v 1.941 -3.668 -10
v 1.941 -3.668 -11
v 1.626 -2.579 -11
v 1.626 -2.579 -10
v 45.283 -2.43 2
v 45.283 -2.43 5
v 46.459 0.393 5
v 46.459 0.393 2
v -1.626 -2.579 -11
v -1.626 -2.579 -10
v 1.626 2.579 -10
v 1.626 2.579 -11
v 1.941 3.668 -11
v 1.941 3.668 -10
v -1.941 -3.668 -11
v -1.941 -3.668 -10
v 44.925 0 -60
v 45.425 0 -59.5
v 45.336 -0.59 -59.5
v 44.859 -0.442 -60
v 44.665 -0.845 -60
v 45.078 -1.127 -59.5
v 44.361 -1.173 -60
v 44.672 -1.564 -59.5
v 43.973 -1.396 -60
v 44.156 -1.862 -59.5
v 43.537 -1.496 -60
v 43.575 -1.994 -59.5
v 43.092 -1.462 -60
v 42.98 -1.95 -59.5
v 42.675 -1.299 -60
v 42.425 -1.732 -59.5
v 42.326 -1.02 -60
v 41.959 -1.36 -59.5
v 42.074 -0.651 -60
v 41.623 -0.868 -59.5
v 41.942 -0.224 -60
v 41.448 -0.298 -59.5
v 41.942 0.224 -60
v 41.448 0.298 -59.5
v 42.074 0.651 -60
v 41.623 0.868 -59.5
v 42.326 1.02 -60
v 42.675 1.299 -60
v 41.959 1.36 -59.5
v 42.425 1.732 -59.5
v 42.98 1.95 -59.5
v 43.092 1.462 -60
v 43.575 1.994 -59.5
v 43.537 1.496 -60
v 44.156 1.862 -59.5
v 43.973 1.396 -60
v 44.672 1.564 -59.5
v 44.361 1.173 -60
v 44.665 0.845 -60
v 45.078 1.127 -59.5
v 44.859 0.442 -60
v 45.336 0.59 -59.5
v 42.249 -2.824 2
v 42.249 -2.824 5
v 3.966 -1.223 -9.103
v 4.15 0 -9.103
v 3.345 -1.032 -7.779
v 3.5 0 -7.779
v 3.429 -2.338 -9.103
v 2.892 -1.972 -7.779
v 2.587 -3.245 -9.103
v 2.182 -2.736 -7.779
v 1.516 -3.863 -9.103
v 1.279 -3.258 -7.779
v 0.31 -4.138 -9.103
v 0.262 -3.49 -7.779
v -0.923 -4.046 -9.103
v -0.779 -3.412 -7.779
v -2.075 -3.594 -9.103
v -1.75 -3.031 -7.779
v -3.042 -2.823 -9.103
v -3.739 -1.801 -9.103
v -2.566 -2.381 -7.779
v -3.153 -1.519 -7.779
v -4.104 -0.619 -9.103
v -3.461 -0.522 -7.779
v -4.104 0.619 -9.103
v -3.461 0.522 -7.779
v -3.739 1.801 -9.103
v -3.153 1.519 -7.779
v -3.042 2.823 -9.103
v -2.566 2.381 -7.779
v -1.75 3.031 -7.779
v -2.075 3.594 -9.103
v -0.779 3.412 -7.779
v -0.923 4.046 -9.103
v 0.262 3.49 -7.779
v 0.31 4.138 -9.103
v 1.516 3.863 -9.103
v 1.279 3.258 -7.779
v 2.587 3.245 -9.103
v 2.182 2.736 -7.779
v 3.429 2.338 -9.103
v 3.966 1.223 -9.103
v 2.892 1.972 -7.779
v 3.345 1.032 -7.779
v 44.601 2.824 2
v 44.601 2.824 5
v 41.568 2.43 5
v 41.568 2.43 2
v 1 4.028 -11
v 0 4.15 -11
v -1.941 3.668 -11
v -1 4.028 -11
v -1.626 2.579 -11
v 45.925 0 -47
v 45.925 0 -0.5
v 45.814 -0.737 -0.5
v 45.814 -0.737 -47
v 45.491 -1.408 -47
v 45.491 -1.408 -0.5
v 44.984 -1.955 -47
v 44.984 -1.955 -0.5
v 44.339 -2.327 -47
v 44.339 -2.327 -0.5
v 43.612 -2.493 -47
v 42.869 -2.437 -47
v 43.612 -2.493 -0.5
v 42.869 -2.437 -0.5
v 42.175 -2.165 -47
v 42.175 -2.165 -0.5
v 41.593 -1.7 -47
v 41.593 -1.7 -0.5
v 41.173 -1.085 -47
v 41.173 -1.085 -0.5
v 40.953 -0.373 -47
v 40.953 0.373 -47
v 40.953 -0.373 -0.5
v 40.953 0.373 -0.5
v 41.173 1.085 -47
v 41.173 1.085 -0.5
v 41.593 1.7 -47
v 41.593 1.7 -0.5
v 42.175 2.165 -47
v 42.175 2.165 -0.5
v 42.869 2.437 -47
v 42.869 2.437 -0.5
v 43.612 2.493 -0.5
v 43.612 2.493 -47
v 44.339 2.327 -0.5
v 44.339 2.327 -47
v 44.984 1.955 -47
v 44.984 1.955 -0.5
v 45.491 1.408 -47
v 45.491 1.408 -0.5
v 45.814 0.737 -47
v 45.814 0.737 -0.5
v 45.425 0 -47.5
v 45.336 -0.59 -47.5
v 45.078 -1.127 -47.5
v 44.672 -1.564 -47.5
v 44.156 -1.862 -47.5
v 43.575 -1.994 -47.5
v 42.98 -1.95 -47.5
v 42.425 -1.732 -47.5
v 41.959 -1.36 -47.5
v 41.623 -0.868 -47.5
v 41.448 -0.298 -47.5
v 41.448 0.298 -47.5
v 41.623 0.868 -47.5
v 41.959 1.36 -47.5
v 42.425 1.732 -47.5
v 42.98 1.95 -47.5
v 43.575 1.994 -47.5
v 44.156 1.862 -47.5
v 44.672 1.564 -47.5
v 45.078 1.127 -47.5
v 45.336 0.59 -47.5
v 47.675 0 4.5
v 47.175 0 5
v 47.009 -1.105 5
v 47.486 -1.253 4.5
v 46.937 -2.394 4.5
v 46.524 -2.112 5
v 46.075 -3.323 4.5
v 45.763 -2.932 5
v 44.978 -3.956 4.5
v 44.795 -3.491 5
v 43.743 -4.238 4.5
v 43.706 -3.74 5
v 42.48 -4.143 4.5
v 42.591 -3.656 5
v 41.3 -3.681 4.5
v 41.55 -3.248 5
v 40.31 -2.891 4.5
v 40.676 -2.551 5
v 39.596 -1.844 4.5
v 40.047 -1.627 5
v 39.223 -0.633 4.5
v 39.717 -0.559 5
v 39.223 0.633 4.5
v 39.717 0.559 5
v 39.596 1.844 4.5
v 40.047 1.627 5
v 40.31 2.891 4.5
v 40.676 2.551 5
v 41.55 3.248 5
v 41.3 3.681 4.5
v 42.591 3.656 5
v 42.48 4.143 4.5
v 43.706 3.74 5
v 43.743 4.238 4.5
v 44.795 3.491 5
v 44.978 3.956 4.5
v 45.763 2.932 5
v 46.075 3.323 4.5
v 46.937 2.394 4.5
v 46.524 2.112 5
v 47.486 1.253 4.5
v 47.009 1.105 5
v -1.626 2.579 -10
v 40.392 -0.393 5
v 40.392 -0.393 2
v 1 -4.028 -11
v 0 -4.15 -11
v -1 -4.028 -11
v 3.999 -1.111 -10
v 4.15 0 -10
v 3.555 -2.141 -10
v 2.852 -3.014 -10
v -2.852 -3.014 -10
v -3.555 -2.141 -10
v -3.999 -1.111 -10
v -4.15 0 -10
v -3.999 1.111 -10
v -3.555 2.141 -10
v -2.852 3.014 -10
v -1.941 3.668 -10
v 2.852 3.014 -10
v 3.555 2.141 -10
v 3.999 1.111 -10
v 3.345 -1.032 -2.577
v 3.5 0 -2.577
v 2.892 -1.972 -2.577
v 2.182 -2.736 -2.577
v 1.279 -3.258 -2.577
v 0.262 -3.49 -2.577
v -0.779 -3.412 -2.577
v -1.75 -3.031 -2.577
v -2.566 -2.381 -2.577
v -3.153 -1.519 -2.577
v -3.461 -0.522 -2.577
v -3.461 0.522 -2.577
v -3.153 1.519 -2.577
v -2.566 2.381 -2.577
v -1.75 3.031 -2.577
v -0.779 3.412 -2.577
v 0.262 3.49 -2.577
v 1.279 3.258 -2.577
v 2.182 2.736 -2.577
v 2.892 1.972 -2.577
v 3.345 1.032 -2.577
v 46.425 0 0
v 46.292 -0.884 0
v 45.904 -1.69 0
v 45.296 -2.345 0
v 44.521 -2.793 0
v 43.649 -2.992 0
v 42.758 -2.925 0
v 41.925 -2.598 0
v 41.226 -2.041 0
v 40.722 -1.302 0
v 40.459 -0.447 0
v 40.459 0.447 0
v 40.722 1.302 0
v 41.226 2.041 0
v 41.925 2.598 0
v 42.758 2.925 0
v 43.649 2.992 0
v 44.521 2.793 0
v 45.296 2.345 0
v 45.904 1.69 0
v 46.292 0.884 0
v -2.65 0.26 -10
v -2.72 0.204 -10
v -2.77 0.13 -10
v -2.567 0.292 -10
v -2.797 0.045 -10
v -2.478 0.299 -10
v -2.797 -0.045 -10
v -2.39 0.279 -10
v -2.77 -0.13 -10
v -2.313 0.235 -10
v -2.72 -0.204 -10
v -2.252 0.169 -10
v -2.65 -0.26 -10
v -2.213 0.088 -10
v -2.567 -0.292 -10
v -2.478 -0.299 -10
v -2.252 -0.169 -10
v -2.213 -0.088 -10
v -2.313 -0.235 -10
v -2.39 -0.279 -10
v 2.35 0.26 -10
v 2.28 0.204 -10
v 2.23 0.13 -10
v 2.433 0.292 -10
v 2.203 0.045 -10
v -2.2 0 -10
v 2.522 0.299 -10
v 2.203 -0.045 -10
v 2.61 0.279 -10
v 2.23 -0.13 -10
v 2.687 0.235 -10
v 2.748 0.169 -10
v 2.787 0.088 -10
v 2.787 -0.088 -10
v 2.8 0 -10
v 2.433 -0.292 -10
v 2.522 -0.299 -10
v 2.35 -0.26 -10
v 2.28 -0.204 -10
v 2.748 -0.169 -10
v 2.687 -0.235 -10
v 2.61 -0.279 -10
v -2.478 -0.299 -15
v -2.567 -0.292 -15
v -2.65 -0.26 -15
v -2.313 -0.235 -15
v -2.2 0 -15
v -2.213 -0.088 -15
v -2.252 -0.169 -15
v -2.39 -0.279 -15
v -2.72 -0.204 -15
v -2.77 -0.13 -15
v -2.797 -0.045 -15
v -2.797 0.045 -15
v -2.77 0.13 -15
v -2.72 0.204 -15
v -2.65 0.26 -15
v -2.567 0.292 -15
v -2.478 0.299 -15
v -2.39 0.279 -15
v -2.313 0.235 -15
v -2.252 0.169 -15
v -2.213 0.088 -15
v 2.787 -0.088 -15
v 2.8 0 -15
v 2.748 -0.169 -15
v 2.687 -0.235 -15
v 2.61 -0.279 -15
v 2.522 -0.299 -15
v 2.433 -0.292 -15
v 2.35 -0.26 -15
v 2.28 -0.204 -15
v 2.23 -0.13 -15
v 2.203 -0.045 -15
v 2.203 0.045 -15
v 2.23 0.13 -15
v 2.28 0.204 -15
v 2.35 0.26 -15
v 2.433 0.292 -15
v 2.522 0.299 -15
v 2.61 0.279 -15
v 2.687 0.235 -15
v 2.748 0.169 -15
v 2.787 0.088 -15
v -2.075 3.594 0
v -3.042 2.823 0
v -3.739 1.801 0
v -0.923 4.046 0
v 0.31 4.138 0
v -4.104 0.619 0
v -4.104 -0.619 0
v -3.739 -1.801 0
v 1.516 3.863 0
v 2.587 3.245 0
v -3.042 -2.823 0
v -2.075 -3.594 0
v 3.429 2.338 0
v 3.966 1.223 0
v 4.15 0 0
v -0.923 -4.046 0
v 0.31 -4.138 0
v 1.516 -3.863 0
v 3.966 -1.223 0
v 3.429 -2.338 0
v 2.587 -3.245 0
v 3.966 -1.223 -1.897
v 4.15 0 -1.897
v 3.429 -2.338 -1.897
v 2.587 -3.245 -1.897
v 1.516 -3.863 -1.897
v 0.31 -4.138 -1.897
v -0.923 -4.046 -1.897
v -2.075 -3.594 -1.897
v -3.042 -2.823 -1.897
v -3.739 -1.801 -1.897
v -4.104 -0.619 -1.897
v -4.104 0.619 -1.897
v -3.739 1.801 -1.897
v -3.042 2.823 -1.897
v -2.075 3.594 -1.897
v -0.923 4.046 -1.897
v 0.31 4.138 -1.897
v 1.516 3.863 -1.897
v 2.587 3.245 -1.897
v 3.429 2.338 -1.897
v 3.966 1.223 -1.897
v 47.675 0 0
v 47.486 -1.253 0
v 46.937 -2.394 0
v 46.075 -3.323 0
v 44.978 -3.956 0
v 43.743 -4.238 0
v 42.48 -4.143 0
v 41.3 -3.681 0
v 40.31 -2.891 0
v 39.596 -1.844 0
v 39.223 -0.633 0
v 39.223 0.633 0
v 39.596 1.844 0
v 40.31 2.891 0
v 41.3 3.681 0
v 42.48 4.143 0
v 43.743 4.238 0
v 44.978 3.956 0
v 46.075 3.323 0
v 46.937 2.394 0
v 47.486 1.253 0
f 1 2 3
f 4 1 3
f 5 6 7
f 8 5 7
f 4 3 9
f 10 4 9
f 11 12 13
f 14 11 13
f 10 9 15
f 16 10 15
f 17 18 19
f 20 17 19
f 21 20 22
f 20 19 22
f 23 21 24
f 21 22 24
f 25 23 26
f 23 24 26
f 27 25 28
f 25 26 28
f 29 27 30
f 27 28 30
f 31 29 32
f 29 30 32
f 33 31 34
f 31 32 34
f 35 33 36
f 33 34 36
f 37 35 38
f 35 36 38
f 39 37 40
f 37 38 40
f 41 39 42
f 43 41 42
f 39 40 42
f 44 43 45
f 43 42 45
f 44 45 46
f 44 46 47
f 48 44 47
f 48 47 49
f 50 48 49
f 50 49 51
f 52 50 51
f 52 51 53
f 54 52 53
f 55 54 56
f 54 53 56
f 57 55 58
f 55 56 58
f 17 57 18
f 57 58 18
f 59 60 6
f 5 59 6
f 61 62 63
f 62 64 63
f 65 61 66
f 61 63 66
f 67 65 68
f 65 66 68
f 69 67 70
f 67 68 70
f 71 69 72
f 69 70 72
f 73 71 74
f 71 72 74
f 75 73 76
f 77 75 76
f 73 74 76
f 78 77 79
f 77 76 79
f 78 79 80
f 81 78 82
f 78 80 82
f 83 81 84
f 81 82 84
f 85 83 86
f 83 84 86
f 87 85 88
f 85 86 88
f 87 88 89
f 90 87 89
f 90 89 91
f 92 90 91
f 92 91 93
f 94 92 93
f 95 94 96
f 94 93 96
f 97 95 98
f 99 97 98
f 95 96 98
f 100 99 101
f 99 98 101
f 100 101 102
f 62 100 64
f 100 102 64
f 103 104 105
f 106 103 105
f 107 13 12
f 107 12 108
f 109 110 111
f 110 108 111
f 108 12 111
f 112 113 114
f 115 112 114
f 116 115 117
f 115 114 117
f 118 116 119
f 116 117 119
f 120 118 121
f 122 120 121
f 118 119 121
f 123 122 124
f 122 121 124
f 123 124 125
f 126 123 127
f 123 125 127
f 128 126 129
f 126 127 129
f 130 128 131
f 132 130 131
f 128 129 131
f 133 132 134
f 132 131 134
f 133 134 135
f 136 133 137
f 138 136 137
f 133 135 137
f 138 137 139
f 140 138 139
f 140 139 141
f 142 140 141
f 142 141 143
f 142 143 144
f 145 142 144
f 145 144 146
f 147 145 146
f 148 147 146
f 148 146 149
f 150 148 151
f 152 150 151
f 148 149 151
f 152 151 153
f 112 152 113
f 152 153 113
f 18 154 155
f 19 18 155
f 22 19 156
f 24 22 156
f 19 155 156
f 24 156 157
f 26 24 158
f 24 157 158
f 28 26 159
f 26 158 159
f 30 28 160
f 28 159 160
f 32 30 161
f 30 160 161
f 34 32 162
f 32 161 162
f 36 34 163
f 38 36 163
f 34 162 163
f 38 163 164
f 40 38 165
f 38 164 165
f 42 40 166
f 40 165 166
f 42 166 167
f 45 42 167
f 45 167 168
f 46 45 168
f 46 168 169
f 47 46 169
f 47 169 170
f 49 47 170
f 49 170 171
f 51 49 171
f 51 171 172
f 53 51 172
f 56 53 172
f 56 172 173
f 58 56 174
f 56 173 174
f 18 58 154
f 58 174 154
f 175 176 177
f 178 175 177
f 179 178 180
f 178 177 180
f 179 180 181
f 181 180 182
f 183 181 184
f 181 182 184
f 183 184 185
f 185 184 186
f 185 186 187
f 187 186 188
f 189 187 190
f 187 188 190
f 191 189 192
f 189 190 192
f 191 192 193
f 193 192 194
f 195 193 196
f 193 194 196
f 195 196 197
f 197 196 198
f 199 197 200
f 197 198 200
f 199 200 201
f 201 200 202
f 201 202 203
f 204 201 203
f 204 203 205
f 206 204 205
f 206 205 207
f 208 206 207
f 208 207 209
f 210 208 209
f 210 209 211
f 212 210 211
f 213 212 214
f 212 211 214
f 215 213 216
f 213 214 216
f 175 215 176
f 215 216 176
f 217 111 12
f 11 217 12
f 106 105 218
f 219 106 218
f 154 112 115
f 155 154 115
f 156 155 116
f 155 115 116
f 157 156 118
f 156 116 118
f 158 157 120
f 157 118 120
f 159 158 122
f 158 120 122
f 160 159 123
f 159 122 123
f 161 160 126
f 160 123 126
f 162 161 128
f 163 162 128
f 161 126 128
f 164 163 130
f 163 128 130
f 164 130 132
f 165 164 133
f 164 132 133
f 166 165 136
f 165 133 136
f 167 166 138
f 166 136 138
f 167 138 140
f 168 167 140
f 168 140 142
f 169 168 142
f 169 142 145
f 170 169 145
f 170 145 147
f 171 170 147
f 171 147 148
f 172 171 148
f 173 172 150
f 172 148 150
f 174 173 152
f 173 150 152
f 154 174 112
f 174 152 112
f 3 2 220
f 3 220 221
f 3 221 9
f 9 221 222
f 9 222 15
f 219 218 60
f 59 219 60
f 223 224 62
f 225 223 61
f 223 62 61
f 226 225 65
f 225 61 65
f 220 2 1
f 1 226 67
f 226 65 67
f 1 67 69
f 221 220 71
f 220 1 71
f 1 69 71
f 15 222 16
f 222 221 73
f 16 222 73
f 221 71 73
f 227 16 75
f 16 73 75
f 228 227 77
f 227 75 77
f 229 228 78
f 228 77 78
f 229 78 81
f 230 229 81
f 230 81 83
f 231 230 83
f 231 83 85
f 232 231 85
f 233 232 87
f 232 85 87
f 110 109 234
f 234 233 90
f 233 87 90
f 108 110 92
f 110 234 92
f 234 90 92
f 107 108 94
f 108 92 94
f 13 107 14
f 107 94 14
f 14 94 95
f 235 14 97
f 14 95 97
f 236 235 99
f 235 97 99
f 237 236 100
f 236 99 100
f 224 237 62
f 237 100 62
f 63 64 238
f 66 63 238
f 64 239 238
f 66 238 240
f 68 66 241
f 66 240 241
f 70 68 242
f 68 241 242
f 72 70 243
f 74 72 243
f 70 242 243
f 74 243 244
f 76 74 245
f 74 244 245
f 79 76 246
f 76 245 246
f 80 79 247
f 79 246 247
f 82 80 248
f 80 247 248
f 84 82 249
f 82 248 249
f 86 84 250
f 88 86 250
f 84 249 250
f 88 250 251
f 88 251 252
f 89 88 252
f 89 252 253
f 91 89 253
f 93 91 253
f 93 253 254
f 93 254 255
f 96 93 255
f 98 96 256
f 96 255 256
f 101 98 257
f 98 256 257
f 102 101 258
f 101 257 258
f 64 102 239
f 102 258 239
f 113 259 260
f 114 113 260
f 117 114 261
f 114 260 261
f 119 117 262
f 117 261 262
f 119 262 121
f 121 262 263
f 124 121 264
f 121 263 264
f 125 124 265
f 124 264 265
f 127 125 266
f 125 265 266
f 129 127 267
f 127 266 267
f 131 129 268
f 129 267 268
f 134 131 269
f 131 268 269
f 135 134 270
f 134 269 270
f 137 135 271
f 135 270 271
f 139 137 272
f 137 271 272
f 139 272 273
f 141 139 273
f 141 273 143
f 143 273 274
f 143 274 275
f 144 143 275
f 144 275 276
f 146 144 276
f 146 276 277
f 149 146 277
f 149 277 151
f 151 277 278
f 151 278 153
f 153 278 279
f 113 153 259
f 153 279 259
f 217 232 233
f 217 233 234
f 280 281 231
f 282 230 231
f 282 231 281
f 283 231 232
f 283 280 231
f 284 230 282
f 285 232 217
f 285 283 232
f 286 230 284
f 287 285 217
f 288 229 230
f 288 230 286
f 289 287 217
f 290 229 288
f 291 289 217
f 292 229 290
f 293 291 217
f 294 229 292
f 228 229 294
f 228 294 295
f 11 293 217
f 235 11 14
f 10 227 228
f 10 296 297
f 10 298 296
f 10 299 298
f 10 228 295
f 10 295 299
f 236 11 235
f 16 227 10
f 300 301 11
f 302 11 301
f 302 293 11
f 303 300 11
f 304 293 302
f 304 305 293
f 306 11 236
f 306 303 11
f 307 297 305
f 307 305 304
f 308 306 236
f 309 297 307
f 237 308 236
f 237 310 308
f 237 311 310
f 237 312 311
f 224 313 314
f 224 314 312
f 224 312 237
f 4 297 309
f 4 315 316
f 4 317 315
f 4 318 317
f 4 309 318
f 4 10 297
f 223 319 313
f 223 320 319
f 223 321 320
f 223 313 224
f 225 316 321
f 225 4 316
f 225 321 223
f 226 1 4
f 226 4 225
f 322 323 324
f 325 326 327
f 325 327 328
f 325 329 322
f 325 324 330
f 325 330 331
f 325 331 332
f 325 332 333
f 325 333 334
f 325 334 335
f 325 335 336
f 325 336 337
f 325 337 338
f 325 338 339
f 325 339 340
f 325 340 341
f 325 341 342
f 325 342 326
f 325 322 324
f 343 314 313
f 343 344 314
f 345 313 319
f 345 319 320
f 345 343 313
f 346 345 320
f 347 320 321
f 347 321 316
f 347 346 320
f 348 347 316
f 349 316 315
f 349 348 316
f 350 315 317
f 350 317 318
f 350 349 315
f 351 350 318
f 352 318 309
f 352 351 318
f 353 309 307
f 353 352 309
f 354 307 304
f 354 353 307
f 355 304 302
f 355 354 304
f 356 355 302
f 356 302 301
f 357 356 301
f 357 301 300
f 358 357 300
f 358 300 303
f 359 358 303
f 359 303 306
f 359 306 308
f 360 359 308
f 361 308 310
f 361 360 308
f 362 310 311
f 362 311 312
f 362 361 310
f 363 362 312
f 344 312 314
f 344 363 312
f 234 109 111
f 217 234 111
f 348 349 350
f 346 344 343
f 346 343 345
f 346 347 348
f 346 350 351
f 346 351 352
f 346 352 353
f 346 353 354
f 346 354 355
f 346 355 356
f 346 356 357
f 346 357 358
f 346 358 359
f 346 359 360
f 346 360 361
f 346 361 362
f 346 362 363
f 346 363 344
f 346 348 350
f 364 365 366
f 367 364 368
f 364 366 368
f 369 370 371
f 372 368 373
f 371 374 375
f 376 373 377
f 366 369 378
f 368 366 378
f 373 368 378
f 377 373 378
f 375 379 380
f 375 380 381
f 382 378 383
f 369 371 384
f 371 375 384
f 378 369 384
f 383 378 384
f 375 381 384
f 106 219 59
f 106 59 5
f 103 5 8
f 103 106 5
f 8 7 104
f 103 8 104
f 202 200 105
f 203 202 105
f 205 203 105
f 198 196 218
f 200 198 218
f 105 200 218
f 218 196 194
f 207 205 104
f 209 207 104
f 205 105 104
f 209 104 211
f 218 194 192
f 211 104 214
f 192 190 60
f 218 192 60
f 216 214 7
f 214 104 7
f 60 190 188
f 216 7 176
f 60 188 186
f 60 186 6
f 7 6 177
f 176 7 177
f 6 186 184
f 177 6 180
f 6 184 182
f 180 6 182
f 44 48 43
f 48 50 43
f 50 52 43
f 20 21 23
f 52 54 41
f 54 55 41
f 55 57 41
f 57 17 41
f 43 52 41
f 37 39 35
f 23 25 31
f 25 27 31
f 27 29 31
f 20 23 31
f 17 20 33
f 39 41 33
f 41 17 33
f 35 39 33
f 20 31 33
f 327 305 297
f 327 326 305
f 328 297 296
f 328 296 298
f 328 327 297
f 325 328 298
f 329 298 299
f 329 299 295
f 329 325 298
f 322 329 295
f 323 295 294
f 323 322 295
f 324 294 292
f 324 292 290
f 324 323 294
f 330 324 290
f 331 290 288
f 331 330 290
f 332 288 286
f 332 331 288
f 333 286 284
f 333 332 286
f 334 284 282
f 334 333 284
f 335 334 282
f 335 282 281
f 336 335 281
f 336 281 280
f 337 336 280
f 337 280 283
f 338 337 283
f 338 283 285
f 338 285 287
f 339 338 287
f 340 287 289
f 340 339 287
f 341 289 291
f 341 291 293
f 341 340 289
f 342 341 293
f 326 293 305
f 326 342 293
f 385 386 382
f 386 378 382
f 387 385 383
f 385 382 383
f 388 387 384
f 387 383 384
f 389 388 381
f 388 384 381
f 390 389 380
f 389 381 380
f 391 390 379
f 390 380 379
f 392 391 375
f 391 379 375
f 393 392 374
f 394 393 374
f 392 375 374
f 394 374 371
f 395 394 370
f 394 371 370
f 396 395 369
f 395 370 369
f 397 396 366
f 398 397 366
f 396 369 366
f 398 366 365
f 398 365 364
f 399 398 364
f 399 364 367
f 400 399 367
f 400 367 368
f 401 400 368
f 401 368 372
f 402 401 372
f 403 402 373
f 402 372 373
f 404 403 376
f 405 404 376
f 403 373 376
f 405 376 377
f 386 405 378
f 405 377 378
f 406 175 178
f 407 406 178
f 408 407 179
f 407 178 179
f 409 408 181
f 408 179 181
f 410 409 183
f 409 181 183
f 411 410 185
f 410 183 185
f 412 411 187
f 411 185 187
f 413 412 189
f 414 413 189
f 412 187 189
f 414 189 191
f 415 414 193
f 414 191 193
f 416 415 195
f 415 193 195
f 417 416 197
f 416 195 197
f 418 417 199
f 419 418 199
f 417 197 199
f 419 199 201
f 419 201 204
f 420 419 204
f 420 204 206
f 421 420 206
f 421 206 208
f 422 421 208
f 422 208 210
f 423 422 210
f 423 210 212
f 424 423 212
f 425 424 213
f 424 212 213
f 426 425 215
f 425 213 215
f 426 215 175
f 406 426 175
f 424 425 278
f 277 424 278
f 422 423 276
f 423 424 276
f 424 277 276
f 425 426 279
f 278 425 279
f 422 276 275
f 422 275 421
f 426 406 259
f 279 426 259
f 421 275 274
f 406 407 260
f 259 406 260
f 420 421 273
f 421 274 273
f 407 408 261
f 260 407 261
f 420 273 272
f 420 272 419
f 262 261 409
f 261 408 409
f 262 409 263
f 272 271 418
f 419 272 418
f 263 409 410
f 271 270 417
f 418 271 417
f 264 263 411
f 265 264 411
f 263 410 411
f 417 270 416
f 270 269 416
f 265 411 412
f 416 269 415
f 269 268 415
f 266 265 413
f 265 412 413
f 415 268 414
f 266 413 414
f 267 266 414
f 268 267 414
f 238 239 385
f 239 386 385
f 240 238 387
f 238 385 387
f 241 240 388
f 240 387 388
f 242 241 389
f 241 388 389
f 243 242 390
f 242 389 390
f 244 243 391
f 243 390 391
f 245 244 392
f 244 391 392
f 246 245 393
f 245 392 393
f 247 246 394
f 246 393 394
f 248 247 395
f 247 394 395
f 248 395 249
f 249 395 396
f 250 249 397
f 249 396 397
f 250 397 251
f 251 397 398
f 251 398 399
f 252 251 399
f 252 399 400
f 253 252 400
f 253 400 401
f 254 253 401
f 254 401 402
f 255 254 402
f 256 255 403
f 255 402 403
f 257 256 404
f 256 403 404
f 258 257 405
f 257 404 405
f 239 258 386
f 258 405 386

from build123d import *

# Parameters (mm, degrees)
F2_R     = 0.3
F3_DEPTH = 4
F4_DEPTH = 1
F7_DEPTH = 3
F8_SIZE  = 0.49999


# Not quite as in the source:
# - a fillet or chamfer is up to 0.001 mm smaller than in the source, because OpenCascade refuses the exact size


with BuildPart() as f1:
    # F0 (on Front) → F1 (revolve)
    with BuildSketch(Plane.XZ):
        Polygon((4.15, 0), (0, 0), (0, -11), (4.15, -11), (4.15, -9.1034269934), (3.5, -7.7787333211), (3.5, -2.5771334185), (4.15, -1.8965730066), align=None)
    revolve(axis=Axis((0, 0, -5.7281980938), (0, 0, -1)))

    # F2 (on face) → F3 (join)
    with BuildSketch(Plane(origin=(0, 0, -11), x_dir=(1, 0, 0), z_dir=(0, 0, -1))):
        with Locations((-2.5, 0)):
            Circle(F2_R)
        with Locations((2.5, 0)):
            Circle(F2_R)
    extrude(amount=F3_DEPTH)

    # F2 (on face) → F4 (cut)
    with BuildSketch(Plane(origin=(0, 0, -11), x_dir=(1, 0, 0), z_dir=(0, 0, -1))):
        with BuildLine():
            Line((-1.6264907317, 2.5791286025), (-1.9413472416, 3.6679246022))
            ThreePointArc((-1.9413472416, 3.6679246022), (-4.15, 0), (-1.9413472416, -3.6679246022))
            Line((-1.9413472416, -3.6679246022), (-1.6264907317, -2.5791286025))
            Line((-1.6264907317, -2.5791286025), (0, -2.5791286025))
            Line((0, -2.5791286025), (1.6264907317, -2.5791286025))
            Line((1.6264907317, -2.5791286025), (1.9413472416, -3.6679246022))
            ThreePointArc((1.9413472416, -3.6679246022), (3.555213851, -2.140783612), (4.15, 0))
            ThreePointArc((4.15, 0), (3.555213851, 2.140783612), (1.9413472416, 3.6679246022))
            Line((1.9413472416, 3.6679246022), (1.6264907317, 2.5791286025))
            Line((1.6264907317, 2.5791286025), (0, 2.5791286025))
            Line((0, 2.5791286025), (-1.6264907317, 2.5791286025))
        make_face()
        with Locations((-2.5, 0)):
            Circle(F2_R, mode=Mode.SUBTRACT)
        with Locations((2.5, 0)):
            Circle(F2_R, mode=Mode.SUBTRACT)
    extrude(amount=-F4_DEPTH, mode=Mode.SUBTRACT)


with BuildPart() as f5:
    # F0 (on Front) → F5 (revolve)
    with BuildSketch(Plane.XZ):
        Polygon((43.4252958298, 5), (43.4252958298, 0), (45.9252958298, 0), (47.6752958298, 0), (47.6752958298, 5), align=None)
        Polygon((45.9252958298, 0), (43.4252958298, 0), (43.4252958298, -60), (45.4252958298, -60), (45.4252958298, -47.5), (45.9252958298, -47.5), align=None)
    revolve(axis=Axis((43.4252958298, 0, -3.0905508995), (0, 0, -1)))

    # F6 (on face) → F7 (cut)
    with BuildSketch(Plane.XY.offset(5)):
        Polygon((46.4586920028, 0.3933412765), (44.6013503785, 2.8236687838), (41.5679542055, 2.4303275073), (40.3918996567, -0.3933412765), (42.2492412811, -2.8236687838), (45.2826374541, -2.4303275073), align=None)
    extrude(amount=-F7_DEPTH, mode=Mode.SUBTRACT)

    # F8 (size 0.5 in the source; OpenCascade refuses exactly that, so slightly less here)
    f8_edges = [f5.edges().sort_by_distance(p)[0] for p in [
        (39.175296, 0, 5),
        (40.925296, 0, 0),
        (40.925296, 0, -47.5),
        (41.425296, 0, -60),
    ]]
    chamfer(f8_edges, length=F8_SIZE)


solid = Compound([f1.part, f5.part])
